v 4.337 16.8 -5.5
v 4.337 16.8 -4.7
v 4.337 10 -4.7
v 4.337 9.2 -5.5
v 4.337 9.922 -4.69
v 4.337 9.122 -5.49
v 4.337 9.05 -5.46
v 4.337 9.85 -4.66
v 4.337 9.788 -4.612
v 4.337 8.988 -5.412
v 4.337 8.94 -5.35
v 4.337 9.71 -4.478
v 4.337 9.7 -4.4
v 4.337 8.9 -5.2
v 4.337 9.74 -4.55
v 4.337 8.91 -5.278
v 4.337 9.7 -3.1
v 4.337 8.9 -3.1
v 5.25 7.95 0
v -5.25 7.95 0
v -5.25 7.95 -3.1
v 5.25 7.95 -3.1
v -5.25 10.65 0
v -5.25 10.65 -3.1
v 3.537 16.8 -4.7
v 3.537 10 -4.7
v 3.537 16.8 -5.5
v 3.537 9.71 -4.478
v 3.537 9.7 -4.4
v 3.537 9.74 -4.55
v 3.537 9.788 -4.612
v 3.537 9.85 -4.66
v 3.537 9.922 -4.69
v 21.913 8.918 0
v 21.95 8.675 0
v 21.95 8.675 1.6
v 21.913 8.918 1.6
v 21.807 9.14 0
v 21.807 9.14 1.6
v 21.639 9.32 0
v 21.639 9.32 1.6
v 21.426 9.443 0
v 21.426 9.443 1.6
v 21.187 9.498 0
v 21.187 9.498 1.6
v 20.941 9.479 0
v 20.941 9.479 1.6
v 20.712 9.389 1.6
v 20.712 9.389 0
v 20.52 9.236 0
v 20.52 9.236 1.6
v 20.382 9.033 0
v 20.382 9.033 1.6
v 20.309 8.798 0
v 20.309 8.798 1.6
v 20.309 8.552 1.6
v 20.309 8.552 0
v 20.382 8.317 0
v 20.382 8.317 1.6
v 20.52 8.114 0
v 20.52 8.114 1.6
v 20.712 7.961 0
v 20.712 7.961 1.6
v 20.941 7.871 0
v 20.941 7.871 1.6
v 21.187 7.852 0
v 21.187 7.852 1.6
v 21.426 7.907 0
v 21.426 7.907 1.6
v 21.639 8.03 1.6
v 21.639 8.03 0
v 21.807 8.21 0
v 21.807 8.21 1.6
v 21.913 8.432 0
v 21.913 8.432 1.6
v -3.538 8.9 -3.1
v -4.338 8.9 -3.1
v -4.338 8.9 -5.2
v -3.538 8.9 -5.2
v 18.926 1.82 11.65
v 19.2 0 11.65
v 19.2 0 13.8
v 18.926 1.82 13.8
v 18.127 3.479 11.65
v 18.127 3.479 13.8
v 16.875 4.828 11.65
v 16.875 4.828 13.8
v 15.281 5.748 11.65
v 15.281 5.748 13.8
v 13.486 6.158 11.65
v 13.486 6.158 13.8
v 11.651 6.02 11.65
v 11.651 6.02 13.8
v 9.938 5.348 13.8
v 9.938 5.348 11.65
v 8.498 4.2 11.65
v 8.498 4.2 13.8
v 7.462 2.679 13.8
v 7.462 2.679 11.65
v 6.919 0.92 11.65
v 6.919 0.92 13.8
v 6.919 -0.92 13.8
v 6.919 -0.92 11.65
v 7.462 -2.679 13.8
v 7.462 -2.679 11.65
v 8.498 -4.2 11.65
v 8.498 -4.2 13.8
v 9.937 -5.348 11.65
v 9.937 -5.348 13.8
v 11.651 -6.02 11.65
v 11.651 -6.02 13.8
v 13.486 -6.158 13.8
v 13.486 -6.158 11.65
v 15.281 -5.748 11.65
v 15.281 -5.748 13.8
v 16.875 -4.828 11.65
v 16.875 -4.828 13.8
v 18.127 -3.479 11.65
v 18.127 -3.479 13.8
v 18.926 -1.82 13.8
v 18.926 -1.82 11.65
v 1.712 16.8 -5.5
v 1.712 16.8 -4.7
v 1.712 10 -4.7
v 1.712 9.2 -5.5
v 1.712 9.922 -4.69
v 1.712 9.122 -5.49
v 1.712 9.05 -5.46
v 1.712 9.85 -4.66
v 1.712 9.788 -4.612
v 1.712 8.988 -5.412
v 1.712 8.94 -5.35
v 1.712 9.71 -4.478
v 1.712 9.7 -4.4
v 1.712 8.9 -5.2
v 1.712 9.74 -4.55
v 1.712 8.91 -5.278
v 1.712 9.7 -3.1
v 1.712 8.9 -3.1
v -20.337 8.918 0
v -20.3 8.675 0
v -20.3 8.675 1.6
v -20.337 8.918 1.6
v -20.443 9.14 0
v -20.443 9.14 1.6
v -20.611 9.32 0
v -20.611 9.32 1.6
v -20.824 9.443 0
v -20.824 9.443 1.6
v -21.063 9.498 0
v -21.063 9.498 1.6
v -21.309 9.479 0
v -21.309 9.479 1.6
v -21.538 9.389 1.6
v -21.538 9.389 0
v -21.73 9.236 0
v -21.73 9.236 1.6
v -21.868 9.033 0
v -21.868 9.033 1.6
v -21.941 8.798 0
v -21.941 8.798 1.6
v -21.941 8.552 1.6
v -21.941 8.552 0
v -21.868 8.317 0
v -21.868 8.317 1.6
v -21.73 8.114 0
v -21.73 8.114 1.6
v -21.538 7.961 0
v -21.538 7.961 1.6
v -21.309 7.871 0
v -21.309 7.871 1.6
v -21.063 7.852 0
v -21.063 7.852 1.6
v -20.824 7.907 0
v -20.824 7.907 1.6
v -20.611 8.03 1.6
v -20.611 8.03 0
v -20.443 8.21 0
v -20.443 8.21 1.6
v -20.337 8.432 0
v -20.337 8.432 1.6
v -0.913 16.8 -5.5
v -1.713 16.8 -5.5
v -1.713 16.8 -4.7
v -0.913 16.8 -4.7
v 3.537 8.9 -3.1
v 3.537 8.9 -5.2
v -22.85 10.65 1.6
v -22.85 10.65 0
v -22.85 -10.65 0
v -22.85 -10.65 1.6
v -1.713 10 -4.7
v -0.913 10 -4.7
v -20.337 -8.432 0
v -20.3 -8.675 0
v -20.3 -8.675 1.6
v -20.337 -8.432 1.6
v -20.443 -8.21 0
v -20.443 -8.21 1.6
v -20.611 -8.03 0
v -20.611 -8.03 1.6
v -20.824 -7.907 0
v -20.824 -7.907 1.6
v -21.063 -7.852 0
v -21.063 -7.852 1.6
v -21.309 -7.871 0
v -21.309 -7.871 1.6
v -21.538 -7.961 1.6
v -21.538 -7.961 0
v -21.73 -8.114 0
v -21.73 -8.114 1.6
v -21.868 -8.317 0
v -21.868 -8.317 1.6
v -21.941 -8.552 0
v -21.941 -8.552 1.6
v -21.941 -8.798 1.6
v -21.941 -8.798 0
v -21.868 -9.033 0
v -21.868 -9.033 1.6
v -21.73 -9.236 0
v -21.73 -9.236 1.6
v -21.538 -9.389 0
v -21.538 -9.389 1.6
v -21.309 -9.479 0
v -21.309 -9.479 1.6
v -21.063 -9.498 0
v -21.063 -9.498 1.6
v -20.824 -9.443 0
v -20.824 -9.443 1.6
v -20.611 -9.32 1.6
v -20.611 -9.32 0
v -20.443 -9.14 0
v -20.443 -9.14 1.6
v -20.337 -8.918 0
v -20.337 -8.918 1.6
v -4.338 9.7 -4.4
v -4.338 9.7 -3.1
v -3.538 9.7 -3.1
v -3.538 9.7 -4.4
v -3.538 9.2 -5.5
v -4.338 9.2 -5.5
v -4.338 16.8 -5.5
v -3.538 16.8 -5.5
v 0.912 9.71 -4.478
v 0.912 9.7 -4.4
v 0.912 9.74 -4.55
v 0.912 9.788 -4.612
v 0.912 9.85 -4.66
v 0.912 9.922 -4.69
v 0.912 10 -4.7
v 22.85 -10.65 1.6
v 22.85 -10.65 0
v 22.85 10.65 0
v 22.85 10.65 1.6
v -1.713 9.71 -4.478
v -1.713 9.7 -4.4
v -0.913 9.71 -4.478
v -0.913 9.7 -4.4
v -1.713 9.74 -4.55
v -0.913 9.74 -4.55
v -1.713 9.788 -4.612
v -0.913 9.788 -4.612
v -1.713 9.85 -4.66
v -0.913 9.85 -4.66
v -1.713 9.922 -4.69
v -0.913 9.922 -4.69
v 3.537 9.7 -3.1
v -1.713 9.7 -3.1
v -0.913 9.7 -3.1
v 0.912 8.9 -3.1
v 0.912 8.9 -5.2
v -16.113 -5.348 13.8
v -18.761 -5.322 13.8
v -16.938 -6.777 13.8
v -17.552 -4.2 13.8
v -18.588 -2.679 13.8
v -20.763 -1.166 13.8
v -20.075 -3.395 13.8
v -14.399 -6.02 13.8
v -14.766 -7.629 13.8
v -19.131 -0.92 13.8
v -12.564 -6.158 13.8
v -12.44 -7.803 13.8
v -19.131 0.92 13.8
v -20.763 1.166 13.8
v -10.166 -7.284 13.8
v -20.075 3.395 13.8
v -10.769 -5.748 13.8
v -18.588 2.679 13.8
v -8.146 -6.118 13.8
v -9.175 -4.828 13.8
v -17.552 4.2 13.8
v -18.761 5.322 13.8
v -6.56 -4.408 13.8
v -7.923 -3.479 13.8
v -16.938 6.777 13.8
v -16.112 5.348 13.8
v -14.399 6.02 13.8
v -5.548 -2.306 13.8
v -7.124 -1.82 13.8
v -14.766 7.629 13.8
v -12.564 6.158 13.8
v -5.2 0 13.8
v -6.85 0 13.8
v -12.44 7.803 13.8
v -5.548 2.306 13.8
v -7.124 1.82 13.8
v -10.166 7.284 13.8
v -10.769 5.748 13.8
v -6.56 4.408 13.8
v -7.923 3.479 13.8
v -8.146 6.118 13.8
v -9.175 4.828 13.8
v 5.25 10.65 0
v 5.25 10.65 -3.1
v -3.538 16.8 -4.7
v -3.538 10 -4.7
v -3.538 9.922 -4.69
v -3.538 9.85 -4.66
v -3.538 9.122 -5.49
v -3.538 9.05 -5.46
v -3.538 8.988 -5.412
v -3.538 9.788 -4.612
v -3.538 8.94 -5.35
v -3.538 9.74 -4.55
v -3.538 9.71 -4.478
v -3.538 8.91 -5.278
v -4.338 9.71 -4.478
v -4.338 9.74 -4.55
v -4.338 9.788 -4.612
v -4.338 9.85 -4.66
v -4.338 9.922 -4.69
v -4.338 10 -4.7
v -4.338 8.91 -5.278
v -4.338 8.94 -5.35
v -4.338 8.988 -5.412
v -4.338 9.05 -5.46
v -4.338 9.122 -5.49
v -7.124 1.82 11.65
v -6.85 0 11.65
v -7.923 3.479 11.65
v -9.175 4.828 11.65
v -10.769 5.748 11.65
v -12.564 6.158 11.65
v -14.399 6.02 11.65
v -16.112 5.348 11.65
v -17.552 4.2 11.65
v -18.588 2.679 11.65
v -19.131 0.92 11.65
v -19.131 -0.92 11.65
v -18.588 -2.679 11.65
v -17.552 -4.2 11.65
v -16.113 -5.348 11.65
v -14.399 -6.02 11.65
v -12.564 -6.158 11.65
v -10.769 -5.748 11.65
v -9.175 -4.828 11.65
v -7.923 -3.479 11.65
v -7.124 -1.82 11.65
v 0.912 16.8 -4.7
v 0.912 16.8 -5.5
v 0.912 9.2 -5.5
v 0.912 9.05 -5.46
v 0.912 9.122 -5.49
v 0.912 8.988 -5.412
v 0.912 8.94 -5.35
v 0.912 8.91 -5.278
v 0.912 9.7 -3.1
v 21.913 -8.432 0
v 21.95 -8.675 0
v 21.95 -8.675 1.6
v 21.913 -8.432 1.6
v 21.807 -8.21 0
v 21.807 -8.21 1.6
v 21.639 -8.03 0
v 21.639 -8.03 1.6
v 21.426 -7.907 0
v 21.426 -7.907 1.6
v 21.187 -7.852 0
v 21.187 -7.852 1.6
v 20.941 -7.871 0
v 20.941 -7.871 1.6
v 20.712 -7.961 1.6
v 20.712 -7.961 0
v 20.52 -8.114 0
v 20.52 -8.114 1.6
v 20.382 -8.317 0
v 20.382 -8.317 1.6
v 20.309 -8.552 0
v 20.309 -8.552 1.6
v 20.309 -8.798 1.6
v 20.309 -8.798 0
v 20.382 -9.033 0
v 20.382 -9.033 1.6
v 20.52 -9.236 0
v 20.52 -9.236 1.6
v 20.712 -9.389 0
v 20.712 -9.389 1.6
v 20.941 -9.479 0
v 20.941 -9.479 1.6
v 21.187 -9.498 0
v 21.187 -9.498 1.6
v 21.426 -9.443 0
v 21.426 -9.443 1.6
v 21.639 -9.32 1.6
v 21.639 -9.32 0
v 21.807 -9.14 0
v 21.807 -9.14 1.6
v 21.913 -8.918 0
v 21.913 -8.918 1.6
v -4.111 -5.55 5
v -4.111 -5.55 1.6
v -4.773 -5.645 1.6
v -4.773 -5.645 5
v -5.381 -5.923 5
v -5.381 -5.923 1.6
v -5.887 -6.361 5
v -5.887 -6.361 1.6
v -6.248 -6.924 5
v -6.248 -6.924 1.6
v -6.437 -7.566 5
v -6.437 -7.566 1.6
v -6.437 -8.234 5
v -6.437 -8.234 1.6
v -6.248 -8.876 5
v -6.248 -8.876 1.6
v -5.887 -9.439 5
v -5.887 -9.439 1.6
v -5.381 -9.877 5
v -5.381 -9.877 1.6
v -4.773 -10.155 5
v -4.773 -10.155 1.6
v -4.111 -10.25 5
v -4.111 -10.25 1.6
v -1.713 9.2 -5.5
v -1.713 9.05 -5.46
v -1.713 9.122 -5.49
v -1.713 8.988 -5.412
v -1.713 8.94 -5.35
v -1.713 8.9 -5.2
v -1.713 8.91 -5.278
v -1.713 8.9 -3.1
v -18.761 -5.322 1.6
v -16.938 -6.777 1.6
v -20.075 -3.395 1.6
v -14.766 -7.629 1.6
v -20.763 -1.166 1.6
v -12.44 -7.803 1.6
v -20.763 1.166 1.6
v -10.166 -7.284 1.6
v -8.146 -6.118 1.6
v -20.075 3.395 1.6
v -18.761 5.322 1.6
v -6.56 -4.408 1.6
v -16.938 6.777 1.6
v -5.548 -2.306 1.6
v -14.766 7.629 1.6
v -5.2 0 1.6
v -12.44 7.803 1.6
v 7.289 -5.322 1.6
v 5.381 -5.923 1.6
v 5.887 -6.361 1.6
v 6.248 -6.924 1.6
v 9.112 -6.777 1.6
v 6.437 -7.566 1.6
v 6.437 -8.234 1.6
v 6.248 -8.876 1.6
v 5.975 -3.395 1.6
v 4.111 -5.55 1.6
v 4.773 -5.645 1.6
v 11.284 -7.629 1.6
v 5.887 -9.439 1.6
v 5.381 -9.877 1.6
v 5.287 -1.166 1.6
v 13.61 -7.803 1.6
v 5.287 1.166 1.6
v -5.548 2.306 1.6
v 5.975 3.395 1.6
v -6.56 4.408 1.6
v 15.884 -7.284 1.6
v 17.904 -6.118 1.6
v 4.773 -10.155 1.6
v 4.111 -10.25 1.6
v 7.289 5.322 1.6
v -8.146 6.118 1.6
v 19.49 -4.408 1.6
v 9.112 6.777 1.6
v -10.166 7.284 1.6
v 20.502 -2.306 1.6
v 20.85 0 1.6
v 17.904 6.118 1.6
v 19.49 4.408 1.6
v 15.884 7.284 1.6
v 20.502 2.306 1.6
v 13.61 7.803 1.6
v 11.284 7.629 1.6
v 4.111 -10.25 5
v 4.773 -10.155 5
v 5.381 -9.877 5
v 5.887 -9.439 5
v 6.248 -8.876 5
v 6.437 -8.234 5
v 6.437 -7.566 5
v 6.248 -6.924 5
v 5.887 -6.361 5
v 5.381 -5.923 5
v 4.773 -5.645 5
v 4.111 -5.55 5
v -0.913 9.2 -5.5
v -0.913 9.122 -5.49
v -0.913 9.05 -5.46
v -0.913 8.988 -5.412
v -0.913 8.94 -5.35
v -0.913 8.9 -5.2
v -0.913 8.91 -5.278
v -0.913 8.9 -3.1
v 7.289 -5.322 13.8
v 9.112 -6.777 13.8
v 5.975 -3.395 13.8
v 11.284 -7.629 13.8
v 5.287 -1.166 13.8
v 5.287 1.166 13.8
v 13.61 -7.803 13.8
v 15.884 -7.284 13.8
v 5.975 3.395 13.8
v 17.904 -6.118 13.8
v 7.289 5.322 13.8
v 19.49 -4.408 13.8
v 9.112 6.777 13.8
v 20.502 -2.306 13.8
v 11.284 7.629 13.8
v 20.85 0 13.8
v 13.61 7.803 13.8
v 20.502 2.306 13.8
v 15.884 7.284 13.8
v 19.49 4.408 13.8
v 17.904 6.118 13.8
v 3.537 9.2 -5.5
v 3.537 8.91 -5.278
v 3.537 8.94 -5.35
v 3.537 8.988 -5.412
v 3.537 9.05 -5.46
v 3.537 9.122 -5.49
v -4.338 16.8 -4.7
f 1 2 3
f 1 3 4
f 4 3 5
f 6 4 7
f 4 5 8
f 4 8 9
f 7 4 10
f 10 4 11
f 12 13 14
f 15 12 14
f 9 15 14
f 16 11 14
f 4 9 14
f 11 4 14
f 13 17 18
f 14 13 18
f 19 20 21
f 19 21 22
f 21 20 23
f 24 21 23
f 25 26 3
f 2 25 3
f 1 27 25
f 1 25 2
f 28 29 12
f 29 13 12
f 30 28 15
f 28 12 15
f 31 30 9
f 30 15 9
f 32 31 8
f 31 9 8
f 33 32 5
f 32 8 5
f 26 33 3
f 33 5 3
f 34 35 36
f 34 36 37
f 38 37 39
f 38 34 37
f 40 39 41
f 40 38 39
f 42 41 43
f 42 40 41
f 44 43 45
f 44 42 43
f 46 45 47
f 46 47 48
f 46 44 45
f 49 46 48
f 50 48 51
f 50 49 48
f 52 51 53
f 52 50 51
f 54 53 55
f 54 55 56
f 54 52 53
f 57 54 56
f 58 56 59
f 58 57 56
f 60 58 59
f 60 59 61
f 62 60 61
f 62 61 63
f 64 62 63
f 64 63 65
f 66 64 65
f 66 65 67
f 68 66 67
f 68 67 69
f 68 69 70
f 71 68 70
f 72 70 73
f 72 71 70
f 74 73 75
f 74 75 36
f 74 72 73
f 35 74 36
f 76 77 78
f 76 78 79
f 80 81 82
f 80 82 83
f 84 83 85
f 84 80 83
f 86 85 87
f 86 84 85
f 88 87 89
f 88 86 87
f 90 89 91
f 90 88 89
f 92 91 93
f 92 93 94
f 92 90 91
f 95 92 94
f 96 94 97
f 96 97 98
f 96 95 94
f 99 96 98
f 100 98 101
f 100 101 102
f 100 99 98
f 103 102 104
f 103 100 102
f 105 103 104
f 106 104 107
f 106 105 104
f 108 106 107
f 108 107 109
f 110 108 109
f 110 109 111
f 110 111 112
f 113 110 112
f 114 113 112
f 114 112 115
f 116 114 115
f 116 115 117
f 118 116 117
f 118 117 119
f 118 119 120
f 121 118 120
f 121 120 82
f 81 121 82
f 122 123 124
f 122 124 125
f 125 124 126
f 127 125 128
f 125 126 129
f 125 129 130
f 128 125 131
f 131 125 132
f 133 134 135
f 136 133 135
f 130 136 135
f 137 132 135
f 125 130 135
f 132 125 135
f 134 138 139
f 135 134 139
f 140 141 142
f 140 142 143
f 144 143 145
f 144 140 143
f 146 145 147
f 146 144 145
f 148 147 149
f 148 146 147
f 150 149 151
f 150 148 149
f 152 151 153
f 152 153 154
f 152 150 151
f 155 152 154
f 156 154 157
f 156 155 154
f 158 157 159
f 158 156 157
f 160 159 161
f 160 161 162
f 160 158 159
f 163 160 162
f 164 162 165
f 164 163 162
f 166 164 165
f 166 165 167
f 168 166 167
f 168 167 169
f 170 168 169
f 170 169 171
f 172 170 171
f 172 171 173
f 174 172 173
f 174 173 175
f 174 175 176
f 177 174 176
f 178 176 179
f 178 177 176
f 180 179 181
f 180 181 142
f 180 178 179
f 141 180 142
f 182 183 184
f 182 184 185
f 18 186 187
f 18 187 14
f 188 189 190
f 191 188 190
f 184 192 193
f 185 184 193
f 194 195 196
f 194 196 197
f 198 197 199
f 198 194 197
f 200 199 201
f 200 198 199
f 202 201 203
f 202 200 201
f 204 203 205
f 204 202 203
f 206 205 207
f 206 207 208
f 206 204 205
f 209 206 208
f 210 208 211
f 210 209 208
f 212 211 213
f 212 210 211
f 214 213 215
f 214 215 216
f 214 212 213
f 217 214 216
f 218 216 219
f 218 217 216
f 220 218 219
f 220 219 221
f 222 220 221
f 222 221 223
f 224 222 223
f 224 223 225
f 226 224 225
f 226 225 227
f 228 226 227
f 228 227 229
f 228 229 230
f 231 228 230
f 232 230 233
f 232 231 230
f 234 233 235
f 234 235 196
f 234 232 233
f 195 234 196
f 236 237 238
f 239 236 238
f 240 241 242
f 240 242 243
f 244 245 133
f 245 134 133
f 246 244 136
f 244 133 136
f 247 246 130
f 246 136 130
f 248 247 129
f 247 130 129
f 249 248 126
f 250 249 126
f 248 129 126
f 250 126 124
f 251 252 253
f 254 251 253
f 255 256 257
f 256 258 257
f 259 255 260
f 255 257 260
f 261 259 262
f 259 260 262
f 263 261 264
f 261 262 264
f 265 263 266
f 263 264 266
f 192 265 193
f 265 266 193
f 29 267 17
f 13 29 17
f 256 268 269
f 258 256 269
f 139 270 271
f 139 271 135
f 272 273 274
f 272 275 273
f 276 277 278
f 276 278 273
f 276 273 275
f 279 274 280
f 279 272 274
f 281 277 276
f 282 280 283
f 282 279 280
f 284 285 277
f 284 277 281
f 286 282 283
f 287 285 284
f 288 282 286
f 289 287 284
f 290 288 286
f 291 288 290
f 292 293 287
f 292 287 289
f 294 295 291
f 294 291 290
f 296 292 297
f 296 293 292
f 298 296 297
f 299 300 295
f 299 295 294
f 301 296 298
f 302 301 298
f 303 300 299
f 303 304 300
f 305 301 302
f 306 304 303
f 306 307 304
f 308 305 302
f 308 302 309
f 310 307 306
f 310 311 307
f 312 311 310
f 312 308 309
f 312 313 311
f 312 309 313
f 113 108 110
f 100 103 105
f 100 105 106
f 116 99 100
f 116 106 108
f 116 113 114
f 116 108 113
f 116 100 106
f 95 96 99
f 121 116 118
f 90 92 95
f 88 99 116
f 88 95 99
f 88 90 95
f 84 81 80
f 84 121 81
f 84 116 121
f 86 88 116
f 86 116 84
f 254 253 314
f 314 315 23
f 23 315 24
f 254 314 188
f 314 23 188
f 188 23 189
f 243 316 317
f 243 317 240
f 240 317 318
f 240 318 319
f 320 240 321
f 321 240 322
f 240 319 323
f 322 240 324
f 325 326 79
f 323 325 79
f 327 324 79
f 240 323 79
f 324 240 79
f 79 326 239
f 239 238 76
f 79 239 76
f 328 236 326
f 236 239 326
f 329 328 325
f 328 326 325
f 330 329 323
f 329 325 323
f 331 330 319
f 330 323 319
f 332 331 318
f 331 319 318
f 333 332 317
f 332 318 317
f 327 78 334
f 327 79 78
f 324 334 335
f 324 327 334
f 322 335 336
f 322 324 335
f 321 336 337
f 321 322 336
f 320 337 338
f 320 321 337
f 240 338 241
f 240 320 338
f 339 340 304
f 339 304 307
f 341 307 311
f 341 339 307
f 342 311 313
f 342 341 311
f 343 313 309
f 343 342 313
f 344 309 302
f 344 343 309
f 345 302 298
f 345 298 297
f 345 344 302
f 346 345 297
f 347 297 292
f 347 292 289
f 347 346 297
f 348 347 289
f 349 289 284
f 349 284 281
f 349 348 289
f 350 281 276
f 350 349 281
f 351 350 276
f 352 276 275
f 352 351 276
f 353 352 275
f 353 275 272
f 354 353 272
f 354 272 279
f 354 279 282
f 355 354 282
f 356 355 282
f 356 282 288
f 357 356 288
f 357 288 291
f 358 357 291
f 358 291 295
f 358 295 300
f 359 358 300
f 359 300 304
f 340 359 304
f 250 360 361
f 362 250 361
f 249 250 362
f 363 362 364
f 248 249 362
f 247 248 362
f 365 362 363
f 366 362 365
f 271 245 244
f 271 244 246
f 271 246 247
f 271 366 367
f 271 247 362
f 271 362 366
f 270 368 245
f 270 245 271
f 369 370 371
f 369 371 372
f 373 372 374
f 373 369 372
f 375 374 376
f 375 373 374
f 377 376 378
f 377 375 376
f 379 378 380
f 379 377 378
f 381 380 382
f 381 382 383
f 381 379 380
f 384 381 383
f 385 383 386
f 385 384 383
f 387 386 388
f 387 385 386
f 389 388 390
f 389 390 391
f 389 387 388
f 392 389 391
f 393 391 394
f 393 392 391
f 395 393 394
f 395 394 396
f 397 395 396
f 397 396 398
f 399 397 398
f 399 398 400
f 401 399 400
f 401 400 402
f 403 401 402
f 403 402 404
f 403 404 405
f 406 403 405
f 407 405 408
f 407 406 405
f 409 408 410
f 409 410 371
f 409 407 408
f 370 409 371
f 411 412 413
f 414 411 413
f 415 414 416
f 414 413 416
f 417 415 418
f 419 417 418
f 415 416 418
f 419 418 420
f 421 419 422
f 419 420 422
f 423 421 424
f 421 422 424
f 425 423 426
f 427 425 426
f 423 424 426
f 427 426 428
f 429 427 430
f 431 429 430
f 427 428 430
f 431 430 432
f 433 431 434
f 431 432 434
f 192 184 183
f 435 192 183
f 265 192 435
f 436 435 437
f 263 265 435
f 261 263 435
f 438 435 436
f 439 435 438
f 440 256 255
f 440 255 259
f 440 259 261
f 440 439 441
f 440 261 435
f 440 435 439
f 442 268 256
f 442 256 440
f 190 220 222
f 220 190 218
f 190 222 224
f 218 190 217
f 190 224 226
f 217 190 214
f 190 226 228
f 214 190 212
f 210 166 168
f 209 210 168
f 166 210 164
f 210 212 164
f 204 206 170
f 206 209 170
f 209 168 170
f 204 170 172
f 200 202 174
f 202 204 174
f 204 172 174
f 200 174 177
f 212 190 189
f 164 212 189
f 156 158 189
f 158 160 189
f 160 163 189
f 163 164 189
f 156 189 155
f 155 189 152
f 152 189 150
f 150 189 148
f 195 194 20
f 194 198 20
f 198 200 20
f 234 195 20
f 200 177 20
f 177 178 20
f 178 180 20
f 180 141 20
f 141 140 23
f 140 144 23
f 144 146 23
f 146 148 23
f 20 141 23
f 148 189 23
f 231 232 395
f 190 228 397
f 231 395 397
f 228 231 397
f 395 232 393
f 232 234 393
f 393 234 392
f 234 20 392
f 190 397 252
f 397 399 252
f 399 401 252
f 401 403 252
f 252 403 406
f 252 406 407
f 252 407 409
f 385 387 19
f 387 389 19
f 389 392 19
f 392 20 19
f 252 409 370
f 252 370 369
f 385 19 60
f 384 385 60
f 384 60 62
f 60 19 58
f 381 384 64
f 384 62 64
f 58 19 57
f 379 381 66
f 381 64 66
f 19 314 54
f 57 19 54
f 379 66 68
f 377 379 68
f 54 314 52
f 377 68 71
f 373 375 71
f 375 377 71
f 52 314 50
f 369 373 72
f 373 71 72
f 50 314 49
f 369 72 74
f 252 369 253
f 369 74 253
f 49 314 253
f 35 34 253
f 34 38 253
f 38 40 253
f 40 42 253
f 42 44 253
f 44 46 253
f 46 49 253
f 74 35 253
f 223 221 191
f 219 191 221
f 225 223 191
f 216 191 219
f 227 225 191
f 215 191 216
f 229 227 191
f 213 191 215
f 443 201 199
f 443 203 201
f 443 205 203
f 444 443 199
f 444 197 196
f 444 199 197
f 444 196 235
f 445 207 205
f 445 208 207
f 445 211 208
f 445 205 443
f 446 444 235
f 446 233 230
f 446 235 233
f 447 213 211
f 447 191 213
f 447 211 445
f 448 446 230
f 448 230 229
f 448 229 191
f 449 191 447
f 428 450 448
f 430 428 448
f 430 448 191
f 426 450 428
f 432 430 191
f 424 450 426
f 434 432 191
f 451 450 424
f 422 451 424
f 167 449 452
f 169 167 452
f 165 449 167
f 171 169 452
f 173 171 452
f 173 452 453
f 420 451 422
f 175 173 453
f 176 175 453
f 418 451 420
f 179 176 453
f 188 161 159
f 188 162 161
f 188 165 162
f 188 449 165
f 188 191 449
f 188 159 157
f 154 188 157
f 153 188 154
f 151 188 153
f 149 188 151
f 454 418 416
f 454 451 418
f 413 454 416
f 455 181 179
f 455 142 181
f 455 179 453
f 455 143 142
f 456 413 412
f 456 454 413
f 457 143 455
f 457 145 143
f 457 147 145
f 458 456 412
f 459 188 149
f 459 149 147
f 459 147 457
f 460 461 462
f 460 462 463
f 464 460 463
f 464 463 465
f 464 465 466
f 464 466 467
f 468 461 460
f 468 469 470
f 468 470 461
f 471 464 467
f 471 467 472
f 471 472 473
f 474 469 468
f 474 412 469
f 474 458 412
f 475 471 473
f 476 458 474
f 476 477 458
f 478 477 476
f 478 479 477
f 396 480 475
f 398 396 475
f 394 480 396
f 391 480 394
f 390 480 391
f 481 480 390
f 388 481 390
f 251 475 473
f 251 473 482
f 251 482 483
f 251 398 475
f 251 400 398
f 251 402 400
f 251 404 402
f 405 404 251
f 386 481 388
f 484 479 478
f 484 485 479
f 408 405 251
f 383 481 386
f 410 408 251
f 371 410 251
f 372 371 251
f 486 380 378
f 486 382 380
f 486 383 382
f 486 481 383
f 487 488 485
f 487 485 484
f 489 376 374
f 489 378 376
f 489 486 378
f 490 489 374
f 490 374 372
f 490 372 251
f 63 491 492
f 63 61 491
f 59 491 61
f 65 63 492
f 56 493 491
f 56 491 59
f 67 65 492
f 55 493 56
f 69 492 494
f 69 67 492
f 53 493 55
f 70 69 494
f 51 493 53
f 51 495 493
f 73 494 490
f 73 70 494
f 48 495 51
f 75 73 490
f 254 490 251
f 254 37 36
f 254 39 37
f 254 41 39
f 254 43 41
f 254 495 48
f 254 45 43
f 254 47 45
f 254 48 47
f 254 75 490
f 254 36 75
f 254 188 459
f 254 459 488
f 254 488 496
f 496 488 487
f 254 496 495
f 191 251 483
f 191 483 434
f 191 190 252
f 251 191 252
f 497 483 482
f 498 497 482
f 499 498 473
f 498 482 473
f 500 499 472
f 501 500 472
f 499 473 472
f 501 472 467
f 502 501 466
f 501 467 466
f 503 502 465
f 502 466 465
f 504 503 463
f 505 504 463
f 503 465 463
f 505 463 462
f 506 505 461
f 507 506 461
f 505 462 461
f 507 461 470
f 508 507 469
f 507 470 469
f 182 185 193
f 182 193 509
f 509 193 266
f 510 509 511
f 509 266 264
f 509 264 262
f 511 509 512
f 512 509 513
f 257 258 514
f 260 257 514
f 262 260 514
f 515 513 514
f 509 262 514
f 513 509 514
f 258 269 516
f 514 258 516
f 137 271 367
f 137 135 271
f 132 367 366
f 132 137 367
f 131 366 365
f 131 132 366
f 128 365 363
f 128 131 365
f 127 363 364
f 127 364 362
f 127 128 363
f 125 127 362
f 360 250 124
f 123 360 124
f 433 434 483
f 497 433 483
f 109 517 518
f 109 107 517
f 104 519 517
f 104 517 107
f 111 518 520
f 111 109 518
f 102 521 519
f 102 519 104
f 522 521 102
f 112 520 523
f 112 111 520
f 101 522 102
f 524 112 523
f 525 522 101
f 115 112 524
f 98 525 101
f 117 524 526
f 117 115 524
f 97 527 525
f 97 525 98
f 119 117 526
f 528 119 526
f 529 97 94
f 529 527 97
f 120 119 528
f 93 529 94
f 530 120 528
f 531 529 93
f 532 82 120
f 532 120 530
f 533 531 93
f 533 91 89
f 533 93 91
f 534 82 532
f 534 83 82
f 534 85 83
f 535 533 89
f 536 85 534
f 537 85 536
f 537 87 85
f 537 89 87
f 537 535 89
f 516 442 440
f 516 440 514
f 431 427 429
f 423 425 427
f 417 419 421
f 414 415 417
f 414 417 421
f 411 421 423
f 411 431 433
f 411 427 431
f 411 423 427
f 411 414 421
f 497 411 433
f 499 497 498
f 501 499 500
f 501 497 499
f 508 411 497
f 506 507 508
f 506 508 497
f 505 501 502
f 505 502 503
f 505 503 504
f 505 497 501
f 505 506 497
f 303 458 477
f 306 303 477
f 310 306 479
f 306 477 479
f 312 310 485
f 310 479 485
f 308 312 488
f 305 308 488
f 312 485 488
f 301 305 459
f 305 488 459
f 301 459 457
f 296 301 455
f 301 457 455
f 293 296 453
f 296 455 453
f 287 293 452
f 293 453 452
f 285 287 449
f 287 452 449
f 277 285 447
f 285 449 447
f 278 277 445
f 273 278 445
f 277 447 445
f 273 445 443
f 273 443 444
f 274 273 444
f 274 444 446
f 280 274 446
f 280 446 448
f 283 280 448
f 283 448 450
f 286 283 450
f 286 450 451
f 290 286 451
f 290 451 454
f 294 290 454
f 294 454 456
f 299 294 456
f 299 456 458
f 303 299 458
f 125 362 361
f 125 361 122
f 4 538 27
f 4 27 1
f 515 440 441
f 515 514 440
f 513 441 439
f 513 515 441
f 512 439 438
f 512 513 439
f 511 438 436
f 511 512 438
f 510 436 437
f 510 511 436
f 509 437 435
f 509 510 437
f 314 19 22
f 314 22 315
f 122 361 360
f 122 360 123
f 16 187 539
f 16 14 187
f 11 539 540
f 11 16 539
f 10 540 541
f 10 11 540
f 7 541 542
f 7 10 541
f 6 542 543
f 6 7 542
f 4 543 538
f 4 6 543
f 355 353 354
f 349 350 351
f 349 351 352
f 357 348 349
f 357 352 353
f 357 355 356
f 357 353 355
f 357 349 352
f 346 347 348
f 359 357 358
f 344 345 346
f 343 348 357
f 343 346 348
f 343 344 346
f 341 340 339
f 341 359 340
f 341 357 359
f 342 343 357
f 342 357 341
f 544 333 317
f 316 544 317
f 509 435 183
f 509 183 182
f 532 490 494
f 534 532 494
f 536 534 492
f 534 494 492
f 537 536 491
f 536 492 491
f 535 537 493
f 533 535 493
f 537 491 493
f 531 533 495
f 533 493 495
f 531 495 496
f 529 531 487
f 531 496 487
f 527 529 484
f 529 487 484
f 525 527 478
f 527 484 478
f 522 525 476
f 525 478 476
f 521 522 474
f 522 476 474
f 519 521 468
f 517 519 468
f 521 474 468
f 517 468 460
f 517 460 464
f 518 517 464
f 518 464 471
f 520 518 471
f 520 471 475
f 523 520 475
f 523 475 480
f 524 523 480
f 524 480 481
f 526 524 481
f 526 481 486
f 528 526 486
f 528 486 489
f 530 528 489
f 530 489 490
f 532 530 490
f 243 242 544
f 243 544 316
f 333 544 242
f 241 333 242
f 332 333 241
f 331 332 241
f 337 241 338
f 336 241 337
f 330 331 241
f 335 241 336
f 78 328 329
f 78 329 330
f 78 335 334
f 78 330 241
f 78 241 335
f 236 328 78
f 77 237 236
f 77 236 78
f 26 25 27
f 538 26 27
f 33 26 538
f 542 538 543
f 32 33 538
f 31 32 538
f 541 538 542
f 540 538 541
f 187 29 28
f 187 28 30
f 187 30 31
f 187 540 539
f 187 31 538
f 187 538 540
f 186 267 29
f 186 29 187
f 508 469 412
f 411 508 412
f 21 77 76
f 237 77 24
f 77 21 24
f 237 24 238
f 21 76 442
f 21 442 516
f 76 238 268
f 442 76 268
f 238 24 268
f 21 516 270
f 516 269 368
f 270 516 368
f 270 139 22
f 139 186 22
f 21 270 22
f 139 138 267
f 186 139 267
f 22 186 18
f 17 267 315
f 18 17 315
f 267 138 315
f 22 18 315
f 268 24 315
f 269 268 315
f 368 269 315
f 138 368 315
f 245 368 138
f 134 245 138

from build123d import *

# Parameters (mm, degrees)
F0_R     = 0.825
F0_R_2   = 7.825
F0_W     = 2.625
F0_H     = 2.7
F1_DEPTH = 1.6
F0_R_3   = 6.175
F2_DEPTH = 13.8
F3_DEPTH = 11.65
F4_DEPTH = 3.1
F5_W     = 0.8
F5_H     = 0.8
F6_DEPTH = 2.4
F8_DEPTH = 0.8
F9_DEPTH = 5
F10_R    = 0.3


with BuildPart() as f1:
    # F0 (on Top) → F1 (new body)
    with BuildSketch(Plane.XY):
        Polygon((22.85, -10.65), (22.85, 10.65), (5.25, 10.65), (5.25, 7.95), (2.625, 7.95), (0, 7.95), (-2.625, 7.95), (-5.25, 7.95), (-5.25, 10.65), (-22.85, 10.65), (-22.85, -10.65), align=None)
        with Locations((-21.125, -8.675)):
            Circle(F0_R, mode=Mode.SUBTRACT)
        with BuildLine():
            ThreePointArc((-4.1107536526, -10.25), (-6.4607536526, -7.9), (-4.1107536526, -5.55))
            Line((-4.1107536526, -5.55), (4.1107536526, -5.55))
            ThreePointArc((4.1107536526, -5.55), (6.4607536526, -7.9), (4.1107536526, -10.25))
            Line((4.1107536526, -10.25), (-4.1107536526, -10.25))
        make_face(mode=Mode.SUBTRACT)
        with Locations((21.125, -8.675)):
            Circle(F0_R, mode=Mode.SUBTRACT)
        with Locations((-13.025, 0)):
            Circle(F0_R_2, mode=Mode.SUBTRACT)
        with Locations((-21.125, 8.675)):
            Circle(F0_R, mode=Mode.SUBTRACT)
        with Locations((13.025, 0)):
            Circle(F0_R_2, mode=Mode.SUBTRACT)
        with Locations((21.125, 8.675)):
            Circle(F0_R, mode=Mode.SUBTRACT)
        with Locations((-3.9375, 9.3)):
            Rectangle(F0_W, F0_H)
        with Locations((-1.3125, 9.3)):
            Rectangle(F0_W, F0_H)
        with Locations((1.3125, 9.3)):
            Rectangle(F0_W, F0_H)
        with Locations((3.9375, 9.3)):
            Rectangle(F0_W, F0_H)
    extrude(amount=F1_DEPTH)

    # F0 (on Top) → F2 (join)
    with BuildSketch(Plane.XY):
        with Locations((13.025, 0)):
            Circle(F0_R_2)
        with Locations((13.025, 0)):
            Circle(F0_R_3, mode=Mode.SUBTRACT)
        with Locations((-13.025, 0)):
            Circle(F0_R_2)
        with Locations((-13.025, 0)):
            Circle(F0_R_3, mode=Mode.SUBTRACT)
    extrude(amount=F2_DEPTH)

    # F0 (on Top) → F3 (join)
    with BuildSketch(Plane.XY):
        with Locations((-13.025, 0)):
            Circle(F0_R_3)
        with Locations((13.025, 0)):
            Circle(F0_R_3)
    extrude(amount=F3_DEPTH)

    # F0 (on Top) → F4 (join)
    with BuildSketch(Plane.XY):
        with Locations((-3.9375, 9.3)):
            Rectangle(F0_W, F0_H)
        with Locations((-1.3125, 9.3)):
            Rectangle(F0_W, F0_H)
        with Locations((1.3125, 9.3)):
            Rectangle(F0_W, F0_H)
        with Locations((3.9375, 9.3)):
            Rectangle(F0_W, F0_H)
    extrude(amount=-F4_DEPTH)

    # F5 (on face) → F6 (join)
    with BuildSketch(Plane(origin=(0, 0, -3.1), x_dir=(1, 0, 0), z_dir=(0, 0, -1))):
        with Locations((-3.9375, -9.3)):
            Rectangle(F5_W, F5_H)
        with Locations((-1.3125100119, -9.3)):
            Rectangle(F5_W, F5_H)
        with Locations((1.3124799761, -9.3)):
            Rectangle(F5_W, F5_H)
        with Locations((3.9374699642, -9.3)):
            Rectangle(F5_W, F5_H)
    extrude(amount=F6_DEPTH)

    # F7 (on face) → F8 (join)
    with BuildSketch(Plane(origin=(0, 0, -5.5), x_dir=(1, 0, 0), z_dir=(0, 0, -1))):
        Polygon((-4.3375, -8.9), (-4.3375, -9.7), (-4.3375, -16.8), (-3.5375, -16.8), (-3.5375, -9.7), (-3.5375, -8.9), align=None)
        Polygon((-1.7125100119, -8.9), (-1.7125100119, -9.7), (-1.7125100119, -16.8), (-0.9125100119, -16.8), (-0.9125100119, -9.7), (-0.9125100119, -8.9), align=None)
        Polygon((0.9124799761, -8.9), (0.9124799761, -9.7), (0.9124799761, -16.8), (1.7124799761, -16.8), (1.7124799761, -9.7), (1.7124799761, -8.9), align=None)
        Polygon((3.5374699642, -8.9), (3.5374699642, -9.7), (3.5374699642, -16.8), (4.3374699642, -16.8), (4.3374699642, -9.7), (4.3374699642, -8.9), align=None)
    extrude(amount=-F8_DEPTH)

    # F0 (on Top) → F9 (join)
    with BuildSketch(Plane.XY):
        with BuildLine():
            Line((4.1107536526, -5.55), (-4.1107536526, -5.55))
            ThreePointArc((-4.1107536526, -5.55), (-6.4607536526, -7.9), (-4.1107536526, -10.25))
            Line((-4.1107536526, -10.25), (4.1107536526, -10.25))
            ThreePointArc((4.1107536526, -10.25), (6.4607536526, -7.9), (4.1107536526, -5.55))
        make_face()
    extrude(amount=F9_DEPTH)

    # F10
    f10_edges = [f1.edges().sort_by_distance(p)[0] for p in [
        (-3.9375, 8.9, -5.5),
        (-1.31251, 8.9, -5.5),
        (1.31248, 8.9, -5.5),
        (3.93747, 8.9, -5.5),
        (3.93747, 9.7, -4.7),
        (1.31248, 9.7, -4.7),
        (-1.31251, 9.7, -4.7),
        (-3.9375, 9.7, -4.7),
    ]]
    fillet(f10_edges, radius=F10_R)


solid = f1.part
